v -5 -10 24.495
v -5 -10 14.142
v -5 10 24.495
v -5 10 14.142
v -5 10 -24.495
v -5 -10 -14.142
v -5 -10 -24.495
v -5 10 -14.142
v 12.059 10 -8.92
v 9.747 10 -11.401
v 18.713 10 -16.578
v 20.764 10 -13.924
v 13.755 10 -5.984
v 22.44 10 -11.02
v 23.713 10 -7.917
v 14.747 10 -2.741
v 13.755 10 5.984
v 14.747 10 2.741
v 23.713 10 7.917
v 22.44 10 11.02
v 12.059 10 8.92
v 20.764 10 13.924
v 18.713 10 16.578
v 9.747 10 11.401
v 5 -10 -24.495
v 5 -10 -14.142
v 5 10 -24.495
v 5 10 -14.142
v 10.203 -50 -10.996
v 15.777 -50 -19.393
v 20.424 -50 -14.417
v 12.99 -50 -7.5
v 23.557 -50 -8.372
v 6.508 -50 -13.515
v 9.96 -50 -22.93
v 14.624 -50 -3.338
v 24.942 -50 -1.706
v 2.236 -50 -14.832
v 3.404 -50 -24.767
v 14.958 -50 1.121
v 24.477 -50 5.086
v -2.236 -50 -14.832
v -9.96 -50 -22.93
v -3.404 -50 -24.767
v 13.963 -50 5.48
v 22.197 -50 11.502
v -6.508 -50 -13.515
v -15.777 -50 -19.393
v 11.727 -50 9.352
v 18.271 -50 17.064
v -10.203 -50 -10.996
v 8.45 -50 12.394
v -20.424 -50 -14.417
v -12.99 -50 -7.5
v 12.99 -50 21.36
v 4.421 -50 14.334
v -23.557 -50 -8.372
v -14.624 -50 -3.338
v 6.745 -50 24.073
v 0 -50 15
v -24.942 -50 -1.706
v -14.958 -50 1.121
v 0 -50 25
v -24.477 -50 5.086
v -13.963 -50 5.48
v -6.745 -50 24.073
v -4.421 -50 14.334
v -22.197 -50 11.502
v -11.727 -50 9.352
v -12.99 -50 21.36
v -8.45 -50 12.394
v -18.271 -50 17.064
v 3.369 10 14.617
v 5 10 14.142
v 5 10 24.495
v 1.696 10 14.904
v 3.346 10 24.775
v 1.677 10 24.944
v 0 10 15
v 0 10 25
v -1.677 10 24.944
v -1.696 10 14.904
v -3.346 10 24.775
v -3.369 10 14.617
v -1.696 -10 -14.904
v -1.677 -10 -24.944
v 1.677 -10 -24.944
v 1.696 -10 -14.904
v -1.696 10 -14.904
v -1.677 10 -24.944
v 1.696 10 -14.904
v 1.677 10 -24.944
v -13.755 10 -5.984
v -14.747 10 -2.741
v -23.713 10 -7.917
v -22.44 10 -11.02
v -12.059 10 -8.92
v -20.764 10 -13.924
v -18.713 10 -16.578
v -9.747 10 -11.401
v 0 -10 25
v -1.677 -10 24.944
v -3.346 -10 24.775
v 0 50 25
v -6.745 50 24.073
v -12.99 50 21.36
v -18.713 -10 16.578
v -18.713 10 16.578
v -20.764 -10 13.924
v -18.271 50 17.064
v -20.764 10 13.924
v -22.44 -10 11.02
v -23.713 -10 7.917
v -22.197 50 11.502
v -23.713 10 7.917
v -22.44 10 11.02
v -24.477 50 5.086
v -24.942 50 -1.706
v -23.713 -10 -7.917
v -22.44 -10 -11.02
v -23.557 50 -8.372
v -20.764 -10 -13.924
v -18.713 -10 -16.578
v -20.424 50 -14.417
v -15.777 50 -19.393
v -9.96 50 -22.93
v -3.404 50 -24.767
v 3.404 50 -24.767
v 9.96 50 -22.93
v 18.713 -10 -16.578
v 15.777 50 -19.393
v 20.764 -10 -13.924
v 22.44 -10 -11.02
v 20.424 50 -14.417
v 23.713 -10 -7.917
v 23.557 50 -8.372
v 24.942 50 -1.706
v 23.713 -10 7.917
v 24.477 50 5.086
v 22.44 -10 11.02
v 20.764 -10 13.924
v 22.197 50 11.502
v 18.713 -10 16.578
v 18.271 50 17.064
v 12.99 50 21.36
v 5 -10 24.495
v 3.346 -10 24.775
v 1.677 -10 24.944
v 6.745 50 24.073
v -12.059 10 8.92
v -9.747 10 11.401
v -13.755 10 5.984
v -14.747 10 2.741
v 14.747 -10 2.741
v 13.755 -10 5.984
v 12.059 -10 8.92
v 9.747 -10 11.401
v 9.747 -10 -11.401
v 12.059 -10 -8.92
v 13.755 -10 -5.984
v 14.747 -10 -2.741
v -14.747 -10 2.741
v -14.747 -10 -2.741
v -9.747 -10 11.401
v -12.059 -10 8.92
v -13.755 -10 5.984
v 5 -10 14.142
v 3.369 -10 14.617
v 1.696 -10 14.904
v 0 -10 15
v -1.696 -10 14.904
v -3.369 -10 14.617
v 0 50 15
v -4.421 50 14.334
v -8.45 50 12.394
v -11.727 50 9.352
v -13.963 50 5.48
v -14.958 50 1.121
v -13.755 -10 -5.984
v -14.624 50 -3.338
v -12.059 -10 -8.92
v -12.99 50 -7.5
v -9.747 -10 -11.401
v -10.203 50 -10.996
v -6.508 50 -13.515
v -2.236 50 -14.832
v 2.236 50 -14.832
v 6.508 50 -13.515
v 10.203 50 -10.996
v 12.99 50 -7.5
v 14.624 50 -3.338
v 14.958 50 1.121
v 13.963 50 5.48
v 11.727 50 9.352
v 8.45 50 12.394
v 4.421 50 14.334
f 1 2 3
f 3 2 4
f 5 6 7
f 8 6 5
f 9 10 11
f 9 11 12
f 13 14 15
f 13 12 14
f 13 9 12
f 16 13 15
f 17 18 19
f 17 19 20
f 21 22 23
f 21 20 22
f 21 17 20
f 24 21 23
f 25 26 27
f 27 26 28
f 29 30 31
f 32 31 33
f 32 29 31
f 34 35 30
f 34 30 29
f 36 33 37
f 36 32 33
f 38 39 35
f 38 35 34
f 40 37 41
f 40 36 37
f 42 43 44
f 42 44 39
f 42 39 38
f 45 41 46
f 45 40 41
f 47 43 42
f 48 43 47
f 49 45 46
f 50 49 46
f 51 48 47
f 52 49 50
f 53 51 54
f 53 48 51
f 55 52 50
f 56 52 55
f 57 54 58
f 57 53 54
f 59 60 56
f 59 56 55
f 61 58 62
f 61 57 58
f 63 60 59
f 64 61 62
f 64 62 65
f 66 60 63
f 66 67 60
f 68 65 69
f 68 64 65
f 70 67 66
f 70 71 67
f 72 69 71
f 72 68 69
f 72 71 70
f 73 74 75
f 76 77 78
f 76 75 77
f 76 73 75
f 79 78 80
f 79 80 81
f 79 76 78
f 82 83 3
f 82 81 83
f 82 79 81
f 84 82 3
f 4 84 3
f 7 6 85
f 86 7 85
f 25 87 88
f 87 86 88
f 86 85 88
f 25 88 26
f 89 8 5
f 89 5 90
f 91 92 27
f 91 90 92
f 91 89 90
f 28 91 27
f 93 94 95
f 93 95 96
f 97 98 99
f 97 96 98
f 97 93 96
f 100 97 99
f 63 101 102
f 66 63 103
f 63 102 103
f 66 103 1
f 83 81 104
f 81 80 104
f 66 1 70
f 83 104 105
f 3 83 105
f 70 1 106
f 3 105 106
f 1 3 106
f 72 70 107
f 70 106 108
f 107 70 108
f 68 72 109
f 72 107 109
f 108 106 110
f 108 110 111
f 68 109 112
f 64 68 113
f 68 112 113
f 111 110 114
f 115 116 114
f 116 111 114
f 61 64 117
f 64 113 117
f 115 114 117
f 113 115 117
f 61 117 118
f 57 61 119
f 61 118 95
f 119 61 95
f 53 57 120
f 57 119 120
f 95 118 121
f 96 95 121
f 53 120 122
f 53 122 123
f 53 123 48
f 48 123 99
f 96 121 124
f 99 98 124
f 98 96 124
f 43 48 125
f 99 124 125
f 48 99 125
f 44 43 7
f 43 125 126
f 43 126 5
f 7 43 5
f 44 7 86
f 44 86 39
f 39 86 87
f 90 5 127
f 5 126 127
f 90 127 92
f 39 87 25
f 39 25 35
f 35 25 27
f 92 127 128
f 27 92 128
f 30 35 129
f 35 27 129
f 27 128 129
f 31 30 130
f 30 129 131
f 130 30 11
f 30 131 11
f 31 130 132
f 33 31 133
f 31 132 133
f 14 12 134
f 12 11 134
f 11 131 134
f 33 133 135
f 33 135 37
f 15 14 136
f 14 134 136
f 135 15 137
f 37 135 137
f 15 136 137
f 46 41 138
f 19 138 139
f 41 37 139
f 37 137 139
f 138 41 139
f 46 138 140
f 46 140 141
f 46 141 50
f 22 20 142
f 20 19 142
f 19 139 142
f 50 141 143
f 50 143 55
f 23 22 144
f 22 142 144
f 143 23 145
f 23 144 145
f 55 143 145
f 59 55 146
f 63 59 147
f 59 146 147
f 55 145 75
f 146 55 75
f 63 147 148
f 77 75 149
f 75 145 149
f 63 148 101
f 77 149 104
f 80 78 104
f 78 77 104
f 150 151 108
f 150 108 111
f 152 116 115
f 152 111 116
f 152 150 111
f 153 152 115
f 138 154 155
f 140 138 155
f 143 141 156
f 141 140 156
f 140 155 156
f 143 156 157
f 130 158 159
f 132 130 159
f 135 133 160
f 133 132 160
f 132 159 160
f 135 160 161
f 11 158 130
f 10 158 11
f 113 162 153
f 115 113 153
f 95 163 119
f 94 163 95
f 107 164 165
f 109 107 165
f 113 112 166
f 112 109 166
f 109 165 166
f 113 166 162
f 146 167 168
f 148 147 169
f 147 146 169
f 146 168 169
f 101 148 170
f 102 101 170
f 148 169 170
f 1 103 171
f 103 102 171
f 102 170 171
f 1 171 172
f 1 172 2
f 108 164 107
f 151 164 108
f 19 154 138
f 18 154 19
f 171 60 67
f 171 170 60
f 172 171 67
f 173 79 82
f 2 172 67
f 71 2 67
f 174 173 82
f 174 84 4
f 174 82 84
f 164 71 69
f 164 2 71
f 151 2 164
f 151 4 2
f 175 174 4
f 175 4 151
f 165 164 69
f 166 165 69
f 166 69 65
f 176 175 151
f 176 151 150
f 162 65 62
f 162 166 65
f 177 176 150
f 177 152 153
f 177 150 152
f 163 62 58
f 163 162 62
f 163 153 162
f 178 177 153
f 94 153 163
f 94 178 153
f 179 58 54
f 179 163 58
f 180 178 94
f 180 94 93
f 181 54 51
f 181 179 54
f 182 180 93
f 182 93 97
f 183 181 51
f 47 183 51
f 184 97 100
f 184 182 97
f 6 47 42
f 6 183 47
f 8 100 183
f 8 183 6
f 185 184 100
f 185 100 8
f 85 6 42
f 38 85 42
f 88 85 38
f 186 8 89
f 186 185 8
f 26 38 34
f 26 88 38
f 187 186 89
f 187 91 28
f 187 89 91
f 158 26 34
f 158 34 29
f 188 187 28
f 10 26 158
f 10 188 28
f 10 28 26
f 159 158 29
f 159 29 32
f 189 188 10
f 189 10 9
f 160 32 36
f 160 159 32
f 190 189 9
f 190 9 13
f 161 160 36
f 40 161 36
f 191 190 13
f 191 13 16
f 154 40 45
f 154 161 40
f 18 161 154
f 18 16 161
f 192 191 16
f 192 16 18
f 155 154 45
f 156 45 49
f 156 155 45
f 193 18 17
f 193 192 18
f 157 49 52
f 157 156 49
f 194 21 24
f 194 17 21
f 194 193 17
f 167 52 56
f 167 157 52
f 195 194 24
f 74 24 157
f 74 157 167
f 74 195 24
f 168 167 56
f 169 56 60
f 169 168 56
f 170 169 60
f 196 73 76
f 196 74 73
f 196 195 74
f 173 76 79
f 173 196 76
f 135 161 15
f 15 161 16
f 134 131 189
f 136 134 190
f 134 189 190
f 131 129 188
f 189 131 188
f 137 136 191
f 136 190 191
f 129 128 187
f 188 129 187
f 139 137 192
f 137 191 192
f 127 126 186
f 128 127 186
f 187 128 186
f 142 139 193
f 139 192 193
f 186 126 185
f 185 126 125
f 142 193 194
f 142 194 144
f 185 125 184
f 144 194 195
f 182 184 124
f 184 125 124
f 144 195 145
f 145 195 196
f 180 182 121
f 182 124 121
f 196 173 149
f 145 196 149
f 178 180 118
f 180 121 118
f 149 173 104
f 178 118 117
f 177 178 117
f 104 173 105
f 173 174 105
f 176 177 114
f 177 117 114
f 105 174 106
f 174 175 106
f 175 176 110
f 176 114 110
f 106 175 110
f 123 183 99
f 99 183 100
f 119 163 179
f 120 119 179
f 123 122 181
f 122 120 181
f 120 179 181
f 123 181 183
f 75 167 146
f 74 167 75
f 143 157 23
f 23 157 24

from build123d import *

# Parameters (mm, degrees)
SKETCH1_W               = 10
SKETCH1_H               = 100
CUT_EXTRUDE1_REACH      = 63.237
CUT_EXTRUDE1_END_RADIUS = 25
SKETCH2_W               = 10
SKETCH2_H               = 20
CIRPATTERN1_COUNT       = 6


with BuildPart() as part:
    # Sketch1 → Revolve1 (revolve)
    with BuildSketch(Plane.XY, mode=Mode.PRIVATE) as revolve1_sk:
        with Locations((-20, 0)):
            Rectangle(SKETCH1_W, SKETCH1_H)
    revolve(revolve1_sk.sketch.rotate(Axis((0, 56.451612903, 0), (0, -1, 0)), 270), axis=Axis((0, 56.451612903, 0), (0, -1, 0)))

    # Cut-Extrude1: up to this cylinder (the profile starts inside it)
    cut_extrude1_end = Plane(origin=(0, 0, 0), z_dir=(0, 1, 0)) * Cylinder(CUT_EXTRUDE1_END_RADIUS, 177.474, mode=Mode.PRIVATE)
    # Sketch2 → Cut-Extrude1 (cut, up to the surface)
    with BuildSketch(Plane.XY, mode=Mode.PRIVATE) as cut_extrude1_sk1:
        Rectangle(SKETCH2_W, SKETCH2_H)
    cut_extrude1_tool1 = extrude(cut_extrude1_sk1.sketch, amount=-CUT_EXTRUDE1_REACH, mode=Mode.PRIVATE) & cut_extrude1_end
    cut_extrude1 = cut_extrude1_tool1.solids().sort_by_distance((0, 0, 0))[0]
    add(cut_extrude1, mode=Mode.SUBTRACT)

    # CirPattern1: Cut-Extrude1 ×6 about axis
    cirpattern1_axis = Axis((0, 0, 0), (0, 1, 0))
    for i in range(1, CIRPATTERN1_COUNT):
        add(cut_extrude1.rotate(cirpattern1_axis, i * 360 / CIRPATTERN1_COUNT), mode=Mode.SUBTRACT)


solid = part.part
